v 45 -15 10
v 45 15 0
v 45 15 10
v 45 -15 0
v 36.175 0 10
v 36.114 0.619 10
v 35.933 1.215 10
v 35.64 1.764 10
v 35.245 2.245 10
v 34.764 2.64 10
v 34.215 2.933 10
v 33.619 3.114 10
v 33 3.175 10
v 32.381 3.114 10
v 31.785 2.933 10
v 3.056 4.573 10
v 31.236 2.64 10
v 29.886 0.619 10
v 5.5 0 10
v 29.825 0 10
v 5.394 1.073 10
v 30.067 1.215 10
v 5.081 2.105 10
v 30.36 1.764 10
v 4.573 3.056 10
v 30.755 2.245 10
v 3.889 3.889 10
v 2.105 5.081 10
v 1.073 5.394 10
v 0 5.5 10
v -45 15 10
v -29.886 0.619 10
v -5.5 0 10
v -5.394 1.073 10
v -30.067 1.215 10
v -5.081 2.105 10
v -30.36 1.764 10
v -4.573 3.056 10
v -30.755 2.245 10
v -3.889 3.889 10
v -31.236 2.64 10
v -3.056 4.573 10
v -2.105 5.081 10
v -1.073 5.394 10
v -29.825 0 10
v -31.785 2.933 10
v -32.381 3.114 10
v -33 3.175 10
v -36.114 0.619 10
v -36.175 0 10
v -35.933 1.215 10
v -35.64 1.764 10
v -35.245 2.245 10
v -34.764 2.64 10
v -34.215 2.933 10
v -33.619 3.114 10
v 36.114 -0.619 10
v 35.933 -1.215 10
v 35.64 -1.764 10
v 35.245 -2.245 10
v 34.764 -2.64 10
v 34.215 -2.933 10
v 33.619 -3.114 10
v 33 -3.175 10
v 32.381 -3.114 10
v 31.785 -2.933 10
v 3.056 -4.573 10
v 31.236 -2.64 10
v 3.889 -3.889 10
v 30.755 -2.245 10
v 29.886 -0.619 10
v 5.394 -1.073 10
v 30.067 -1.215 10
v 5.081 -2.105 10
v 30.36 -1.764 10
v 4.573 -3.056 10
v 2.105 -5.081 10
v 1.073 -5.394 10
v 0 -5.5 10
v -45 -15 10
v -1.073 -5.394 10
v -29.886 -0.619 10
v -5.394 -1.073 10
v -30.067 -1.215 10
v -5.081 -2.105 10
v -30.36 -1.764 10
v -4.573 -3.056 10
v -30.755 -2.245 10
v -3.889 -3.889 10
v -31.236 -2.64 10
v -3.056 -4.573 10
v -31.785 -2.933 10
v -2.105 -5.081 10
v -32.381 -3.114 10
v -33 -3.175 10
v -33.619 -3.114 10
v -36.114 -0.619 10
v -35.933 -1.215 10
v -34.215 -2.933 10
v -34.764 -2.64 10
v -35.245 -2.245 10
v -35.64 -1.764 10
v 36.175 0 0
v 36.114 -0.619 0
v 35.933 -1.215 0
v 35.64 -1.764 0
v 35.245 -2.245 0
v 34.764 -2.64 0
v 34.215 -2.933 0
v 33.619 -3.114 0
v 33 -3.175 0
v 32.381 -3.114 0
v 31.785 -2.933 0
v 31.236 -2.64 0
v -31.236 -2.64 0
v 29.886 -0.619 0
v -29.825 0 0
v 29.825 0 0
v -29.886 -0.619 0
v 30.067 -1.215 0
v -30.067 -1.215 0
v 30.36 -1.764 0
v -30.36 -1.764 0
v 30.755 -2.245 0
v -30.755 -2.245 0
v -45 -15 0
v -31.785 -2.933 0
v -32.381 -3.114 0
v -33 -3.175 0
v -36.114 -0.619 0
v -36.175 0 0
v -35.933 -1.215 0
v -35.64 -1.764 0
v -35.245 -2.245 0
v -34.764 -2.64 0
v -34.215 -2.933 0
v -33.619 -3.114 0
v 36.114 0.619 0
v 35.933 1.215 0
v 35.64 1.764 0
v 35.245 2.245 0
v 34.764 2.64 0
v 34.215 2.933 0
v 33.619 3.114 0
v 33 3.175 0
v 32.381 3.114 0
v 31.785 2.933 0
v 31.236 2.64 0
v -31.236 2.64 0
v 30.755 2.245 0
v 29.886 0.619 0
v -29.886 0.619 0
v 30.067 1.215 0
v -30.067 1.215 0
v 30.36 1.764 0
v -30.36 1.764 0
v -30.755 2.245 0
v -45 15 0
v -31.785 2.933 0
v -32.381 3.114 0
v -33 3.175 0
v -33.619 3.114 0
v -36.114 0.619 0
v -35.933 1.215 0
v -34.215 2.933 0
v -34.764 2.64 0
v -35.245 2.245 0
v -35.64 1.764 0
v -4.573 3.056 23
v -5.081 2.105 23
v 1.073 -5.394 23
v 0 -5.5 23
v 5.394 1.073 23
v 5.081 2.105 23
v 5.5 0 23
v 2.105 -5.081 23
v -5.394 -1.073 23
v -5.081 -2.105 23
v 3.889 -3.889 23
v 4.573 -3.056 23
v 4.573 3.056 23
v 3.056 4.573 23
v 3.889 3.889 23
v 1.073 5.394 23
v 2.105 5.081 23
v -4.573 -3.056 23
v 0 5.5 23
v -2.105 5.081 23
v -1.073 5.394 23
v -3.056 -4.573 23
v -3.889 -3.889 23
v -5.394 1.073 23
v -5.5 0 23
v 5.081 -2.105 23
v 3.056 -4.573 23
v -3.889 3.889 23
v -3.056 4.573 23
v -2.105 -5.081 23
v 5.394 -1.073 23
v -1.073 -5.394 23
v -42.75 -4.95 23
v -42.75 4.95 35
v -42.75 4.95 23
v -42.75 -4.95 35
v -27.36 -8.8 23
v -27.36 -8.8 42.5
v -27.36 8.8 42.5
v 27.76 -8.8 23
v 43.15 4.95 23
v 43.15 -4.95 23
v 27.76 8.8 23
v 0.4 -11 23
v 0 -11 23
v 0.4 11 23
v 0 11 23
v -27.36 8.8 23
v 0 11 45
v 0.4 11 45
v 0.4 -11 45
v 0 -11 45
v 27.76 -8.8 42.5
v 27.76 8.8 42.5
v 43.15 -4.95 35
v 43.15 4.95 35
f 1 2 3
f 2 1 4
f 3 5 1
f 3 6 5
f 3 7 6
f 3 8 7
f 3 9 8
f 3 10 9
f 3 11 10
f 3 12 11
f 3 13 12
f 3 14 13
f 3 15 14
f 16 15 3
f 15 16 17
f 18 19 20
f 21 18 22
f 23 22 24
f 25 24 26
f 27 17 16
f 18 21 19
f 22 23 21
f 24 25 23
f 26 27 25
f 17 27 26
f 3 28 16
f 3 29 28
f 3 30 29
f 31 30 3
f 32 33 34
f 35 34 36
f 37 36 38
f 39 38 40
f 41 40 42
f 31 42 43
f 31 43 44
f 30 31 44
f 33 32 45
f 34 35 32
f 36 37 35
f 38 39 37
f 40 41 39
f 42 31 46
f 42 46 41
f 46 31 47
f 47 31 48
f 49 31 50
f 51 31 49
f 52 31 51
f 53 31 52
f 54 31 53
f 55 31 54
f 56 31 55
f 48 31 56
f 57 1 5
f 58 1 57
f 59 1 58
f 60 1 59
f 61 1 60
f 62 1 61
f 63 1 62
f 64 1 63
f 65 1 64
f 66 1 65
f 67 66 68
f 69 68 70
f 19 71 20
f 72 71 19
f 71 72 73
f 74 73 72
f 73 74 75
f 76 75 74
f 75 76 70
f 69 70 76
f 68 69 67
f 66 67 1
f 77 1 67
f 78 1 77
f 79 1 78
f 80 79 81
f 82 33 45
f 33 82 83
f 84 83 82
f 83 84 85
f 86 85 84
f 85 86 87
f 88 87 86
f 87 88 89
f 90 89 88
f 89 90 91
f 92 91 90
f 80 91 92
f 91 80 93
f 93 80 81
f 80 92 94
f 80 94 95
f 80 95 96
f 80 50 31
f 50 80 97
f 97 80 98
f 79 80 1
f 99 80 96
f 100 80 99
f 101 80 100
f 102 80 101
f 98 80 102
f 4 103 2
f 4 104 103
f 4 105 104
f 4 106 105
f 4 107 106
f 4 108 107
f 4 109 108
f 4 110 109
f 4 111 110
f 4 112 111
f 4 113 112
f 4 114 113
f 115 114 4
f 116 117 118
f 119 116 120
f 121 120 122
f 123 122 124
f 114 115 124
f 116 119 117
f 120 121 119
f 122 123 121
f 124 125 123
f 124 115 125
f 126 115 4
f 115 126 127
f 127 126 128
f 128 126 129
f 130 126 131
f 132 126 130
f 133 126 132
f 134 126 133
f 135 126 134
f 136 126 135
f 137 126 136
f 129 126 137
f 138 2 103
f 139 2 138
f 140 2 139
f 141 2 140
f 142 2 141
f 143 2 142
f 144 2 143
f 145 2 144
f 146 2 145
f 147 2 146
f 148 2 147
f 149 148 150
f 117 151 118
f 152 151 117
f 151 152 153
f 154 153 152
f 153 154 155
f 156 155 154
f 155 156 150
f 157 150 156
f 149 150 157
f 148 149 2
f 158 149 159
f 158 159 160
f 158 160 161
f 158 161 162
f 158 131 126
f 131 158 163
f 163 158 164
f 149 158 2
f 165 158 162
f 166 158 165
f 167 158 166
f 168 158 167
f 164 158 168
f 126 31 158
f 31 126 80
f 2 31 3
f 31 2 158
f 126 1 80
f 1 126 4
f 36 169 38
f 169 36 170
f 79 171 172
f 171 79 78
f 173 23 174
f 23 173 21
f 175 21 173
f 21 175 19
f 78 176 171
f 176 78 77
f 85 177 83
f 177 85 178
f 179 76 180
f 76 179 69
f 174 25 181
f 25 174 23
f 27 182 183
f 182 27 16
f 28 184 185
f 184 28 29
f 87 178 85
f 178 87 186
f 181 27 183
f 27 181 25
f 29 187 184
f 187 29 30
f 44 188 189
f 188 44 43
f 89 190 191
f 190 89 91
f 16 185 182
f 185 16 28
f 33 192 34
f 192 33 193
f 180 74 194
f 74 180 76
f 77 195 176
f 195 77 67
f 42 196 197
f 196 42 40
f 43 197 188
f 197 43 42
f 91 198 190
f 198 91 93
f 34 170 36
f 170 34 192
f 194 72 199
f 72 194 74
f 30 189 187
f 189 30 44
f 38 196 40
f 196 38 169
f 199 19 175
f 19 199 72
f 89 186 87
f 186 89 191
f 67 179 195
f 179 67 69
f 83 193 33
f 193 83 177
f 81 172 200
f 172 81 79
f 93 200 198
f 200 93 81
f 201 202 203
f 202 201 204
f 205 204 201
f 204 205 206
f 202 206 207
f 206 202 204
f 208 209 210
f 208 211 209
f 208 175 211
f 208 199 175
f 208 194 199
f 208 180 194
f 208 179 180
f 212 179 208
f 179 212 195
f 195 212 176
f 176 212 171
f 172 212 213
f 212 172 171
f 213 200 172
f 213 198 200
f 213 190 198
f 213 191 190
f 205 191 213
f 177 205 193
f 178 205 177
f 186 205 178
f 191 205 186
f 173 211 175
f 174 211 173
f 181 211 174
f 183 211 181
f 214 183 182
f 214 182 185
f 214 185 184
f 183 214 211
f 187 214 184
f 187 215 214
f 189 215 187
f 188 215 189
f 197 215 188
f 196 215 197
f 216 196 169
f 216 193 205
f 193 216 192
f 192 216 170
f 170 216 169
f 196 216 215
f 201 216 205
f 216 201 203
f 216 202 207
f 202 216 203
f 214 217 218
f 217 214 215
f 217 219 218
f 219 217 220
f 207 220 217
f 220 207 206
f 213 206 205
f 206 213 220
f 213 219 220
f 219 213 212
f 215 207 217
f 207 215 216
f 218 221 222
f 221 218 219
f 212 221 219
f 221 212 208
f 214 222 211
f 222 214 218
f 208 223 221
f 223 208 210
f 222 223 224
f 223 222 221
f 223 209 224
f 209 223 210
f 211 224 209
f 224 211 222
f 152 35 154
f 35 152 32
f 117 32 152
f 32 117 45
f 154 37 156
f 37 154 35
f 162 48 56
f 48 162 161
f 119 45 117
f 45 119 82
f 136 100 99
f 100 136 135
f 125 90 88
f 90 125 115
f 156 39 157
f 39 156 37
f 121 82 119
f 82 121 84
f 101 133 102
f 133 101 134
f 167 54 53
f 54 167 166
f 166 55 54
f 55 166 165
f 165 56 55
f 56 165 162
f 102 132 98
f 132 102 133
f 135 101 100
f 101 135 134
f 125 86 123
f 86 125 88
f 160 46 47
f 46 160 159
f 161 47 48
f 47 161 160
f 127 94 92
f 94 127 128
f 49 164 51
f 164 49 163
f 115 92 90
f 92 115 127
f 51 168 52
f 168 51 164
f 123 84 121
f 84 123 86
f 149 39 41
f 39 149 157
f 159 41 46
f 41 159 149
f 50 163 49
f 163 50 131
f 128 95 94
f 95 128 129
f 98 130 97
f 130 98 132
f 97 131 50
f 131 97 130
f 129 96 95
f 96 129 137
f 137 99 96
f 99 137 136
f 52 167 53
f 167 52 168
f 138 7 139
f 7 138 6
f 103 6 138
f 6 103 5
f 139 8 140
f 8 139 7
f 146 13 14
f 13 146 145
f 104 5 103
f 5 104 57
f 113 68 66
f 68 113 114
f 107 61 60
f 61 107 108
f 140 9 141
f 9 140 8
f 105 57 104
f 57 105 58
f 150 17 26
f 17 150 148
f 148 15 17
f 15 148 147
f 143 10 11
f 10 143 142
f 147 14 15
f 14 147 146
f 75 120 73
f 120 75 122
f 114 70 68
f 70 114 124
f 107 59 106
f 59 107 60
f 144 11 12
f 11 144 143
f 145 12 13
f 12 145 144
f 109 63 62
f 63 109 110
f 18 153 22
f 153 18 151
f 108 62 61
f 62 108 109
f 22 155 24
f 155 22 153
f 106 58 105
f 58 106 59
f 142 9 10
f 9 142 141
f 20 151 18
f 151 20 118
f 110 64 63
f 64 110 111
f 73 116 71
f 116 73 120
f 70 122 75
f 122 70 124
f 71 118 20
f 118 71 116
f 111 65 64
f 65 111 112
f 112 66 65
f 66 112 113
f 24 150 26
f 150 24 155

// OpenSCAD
$fn = 32;

// ----------------------------------------------------------------------
// Boat cleat: 90 mm base, horn 34 mm up
// ----------------------------------------------------------------------

// --- parameters (mm) ---
base_l = 90;              // base length
base_w = 30;              // base width
base_t = 10;              // base thickness
horn_len = 85.5;          // horn length
horn_d = 22;              // horn diameter at the middle
horn_z = 34;              // horn axis height
end_drop = 10;            // how far the horn tips drop
post_d = 11;              // centre post diameter
holes_d = 6.35;           // fixing holes
hole_x = 33;              // fixing hole spacing

difference() {
  union() {
    translate([-45, -15, 0]) cube([base_l, base_w, base_t]);
    /* centre post, sunk 1 mm into the base */
    translate([0, 0, 9]) cylinder(h = 25, d = post_d);
    /* horn: a hull chain of boxes, full in the middle and lighter at the tips */
    hull() {
      translate([-42.75, -4.95, 23]) cube([0.4, 9.9, 12], center = false);
      translate([-27.36, -8.8, 23]) cube([0.4, 17.6, 19.5], center = false);
    }
    hull() {
      translate([-27.36, -8.8, 23]) cube([0.4, 17.6, 19.5], center = false);
      translate([0, -11, 23]) cube([0.4, 22, 22], center = false);
    }
    hull() {
      translate([0, -11, 23]) cube([0.4, 22, 22], center = false);
      translate([27.36, -8.8, 23]) cube([0.4, 17.6, 19.5], center = false);
    }
    hull() {
      translate([27.36, -8.8, 23]) cube([0.4, 17.6, 19.5], center = false);
      translate([42.75, -4.95, 23]) cube([0.4, 9.9, 12], center = false);
    }
  }
  translate([-33, 0, -2.5]) cylinder(h = base_t + 5, d = holes_d);
  translate([33, 0, -2.5]) cylinder(h = base_t + 5, d = holes_d);
}
